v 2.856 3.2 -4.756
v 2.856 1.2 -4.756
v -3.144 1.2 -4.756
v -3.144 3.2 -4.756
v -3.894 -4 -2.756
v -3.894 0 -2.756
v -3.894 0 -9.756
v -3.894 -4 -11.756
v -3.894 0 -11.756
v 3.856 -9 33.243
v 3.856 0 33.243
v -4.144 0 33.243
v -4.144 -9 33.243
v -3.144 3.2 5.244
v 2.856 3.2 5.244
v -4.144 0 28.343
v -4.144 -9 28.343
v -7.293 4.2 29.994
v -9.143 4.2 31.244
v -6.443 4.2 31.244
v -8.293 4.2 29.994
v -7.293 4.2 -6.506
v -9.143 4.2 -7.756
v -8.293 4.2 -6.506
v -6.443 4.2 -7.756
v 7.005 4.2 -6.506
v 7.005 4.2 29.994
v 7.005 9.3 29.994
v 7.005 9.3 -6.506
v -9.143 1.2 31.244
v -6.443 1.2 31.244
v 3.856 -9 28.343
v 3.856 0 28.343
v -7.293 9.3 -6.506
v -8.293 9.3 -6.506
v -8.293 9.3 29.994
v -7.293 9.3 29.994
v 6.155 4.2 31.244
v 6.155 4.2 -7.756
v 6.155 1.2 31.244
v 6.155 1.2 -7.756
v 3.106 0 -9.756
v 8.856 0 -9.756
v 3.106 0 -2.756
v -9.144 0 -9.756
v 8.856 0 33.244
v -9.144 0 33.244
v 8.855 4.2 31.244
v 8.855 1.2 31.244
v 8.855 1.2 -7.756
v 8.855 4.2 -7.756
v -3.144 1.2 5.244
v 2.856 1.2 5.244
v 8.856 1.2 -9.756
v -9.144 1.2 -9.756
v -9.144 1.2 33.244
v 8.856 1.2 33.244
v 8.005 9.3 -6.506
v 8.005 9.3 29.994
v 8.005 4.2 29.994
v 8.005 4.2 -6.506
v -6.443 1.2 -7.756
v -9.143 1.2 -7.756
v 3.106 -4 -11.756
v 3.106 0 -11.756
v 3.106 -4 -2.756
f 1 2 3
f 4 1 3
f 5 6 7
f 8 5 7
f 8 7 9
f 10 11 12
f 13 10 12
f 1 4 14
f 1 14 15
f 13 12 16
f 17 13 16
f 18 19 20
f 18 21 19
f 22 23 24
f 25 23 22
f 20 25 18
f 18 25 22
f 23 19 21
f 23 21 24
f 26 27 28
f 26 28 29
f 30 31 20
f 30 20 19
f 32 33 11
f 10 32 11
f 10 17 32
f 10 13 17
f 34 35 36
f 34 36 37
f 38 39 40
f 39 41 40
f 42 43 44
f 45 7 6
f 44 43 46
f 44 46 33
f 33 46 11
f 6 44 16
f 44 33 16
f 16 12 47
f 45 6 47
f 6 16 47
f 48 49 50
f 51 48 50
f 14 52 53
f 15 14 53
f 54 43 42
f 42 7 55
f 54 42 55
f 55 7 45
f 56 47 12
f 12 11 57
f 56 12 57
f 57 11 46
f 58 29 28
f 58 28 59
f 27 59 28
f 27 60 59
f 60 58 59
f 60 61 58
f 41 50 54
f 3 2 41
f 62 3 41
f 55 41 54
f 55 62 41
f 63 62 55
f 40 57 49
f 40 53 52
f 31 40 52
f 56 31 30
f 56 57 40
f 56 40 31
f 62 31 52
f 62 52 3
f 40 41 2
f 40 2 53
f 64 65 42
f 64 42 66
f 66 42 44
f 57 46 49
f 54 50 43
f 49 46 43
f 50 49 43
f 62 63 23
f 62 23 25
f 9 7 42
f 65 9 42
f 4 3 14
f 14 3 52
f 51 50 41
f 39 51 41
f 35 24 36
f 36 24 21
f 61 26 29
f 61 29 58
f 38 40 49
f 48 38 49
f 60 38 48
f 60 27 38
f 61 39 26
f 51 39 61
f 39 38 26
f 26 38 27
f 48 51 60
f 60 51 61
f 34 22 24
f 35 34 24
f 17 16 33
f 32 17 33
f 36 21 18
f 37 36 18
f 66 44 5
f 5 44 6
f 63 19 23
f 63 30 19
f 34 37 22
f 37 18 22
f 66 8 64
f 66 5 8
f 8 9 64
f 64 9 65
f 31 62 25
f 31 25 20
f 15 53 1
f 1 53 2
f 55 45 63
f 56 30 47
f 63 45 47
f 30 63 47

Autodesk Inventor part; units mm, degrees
ref_plane "YZ Plane" through (0, 0, 0) normal (1, 0, 0) x (0, 1, 0)
ref_plane "XZ Plane" through (0, 0, 0) normal (0, 1, 0) x (-1, 0, 0)
ref_plane "XY Plane" through (0, 0, 0) normal (0, 0, 1) x (1, 0, 0)
sketch "Sketch1" plane through (0, 0, 0) normal (0, 1, 0) x (-1, 0, 0)
  line L0 (9.1437, 33.2437) -> (-8.8563, 33.2437)
  line L1 (-8.8563, 33.2437) -> (-8.8562, -9.7563)
  line L2 (-8.8562, -9.7563) -> (9.1438, -9.7563)
  line L3 (9.1438, -9.7563) -> (9.1437, 33.2437)
  point P0 (0, 0)
  dimension "d0" = 18
  dimension "d1" = 43
extrude "Extrusion1" add sketch "Sketch1" along normal blind 1.2
sketch "Sketch2" plane through (0, 1.2, 0) normal (0, 1, 0) x (1, 0, 0)
  line L0 (-6.4427, -31.2437) -> (-9.1427, -31.2437)
  line L1 (-9.1427, -31.2437) -> (-9.1427, 7.7563)
  line L2 (-9.1427, 7.7563) -> (-6.4428, 7.7563)
  line L3 (-6.4428, 7.7563) -> (-6.4427, -31.2437)
  line L4 (-9.1438, 9.7563) -> (-9.1437, -33.2437) projected
  line L5 (8.8562, 9.7563) -> (-9.1438, 9.7563) projected
  line L6 (-9.1437, -33.2437) -> (8.8563, -33.2437) projected
  line L7 (-0.1437, -33.2437) -> (-0.1438, 9.7563)
  line L8 (6.1553, -31.2437) -> (8.8553, -31.2437)
  line L9 (8.8553, -31.2437) -> (8.8552, 7.7563)
  line L10 (8.8552, 7.7563) -> (6.1552, 7.7563)
  line L11 (6.1552, 7.7563) -> (6.1553, -31.2437)
  line L12 (8.8562, 9.7563) -> (8.8563, -33.2437)
  point P0 (0, 0)
  dimension "d4" = 0.001
  dimension "d5" = 2
  dimension "d6" = 2
  dimension "d7" = 2.7
extrude "Extrusion2" add sketch "Sketch2" along normal blind 3 contours L0 L1 L2 L3 | L8 L11 L10 L9
sketch "Sketch3" plane through (0, 1.2, 0) normal (0, 1, 0) x (1, 0, 0)
  line L0 (2.8563, 4.7563) -> (-3.1437, 4.7563)
  line L1 (-3.1437, 4.7563) -> (-3.1437, -5.2437)
  line L2 (-3.1437, -5.2437) -> (2.8563, -5.2437)
  line L3 (2.8563, -5.2437) -> (2.8563, 4.7563)
  line L4 (8.8562, 9.7563) -> (-9.1438, 9.7563) projected
  line L5 (8.8563, -33.2437) -> (8.8562, 9.7563) projected
  line L6 (-9.1438, 9.7563) -> (-9.1437, -33.2437) projected
  point P0 (0, 0)
  dimension "d10" = 5
  dimension "d11" = 10
  dimension "d12" = 6
  dimension "d13" = 6
extrude "Extrusion3" add sketch "Sketch3" along normal blind 2
sketch "Sketch4" plane through (0, 0, 0) normal (0, -1, 0) x (1, 0, 0)
  line L0 (-3.8938, -11.7563) -> (3.1062, -11.7563)
  line L1 (3.1062, -11.7563) -> (3.1062, -2.7563)
  line L2 (3.1062, -2.7563) -> (-3.8938, -2.7563)
  line L3 (-3.8938, -2.7563) -> (-3.8938, -11.7563)
  line L4 (-9.1438, -9.7563) -> (-9.1437, 33.2437) projected
  line L5 (8.8563, 33.2437) -> (8.8562, -9.7563) projected
  line L6 (8.8562, -9.7563) -> (-9.1438, -9.7563) projected
  point P0 (0, 0)
  dimension "d16" = 7
  dimension "d17" = 5.25
  dimension "d18" = 5.75
  dimension "d19" = 7
  dimension "d20" = 2
extrude "Extrusion4" add sketch "Sketch4" along normal blind 4
sketch "Sketch5" plane through (0, 0, 0) normal (0, -1, 0) x (1, 0, 0)
  line L0 (3.8563, 33.2427) -> (-4.1437, 33.2427)
  line L1 (-4.1437, 33.2427) -> (-4.1437, 28.3427)
  line L2 (-4.1437, 28.3427) -> (3.8563, 28.3427)
  line L3 (3.8563, 28.3427) -> (3.8563, 33.2427)
  line L4 (8.8563, 33.2437) -> (8.8562, -9.7563) projected
  line L5 (-9.1438, -9.7563) -> (-9.1437, 33.2437) projected
  line L6 (-9.1437, 33.2437) -> (8.8563, 33.2437) projected
  point P0 (0, 0)
  dimension "d23" = 5
  dimension "d24" = 5
  dimension "d25" = 0.001
  dimension "d26" = 4.9
extrude "Extrusion5" add sketch "Sketch5" along normal blind 9
sketch "Sketch6" plane through (0, 4.2, 0) normal (0, 1, 0) x (1, 0, 0)
  line L0 (-8.2927, -29.9937) -> (-7.2927, -29.9937)
  line L1 (-7.2927, -29.9937) -> (-7.2928, 6.5063)
  line L2 (-7.2928, 6.5063) -> (-8.2927, 6.5063)
  line L3 (-8.2927, 6.5063) -> (-8.2927, -29.9937)
  line L4 (-9.1427, 7.7563) -> (-9.1427, -31.2437) projected
  line L5 (-6.4427, -31.2437) -> (-6.4428, 7.7563) projected
  line L6 (-9.1427, -31.2437) -> (-6.4427, -31.2437) projected
  line L7 (-6.4428, 7.7563) -> (-9.1427, 7.7563) projected
  line L8 (-9.1437, -33.2437) -> (8.8563, -33.2437) projected
  line L9 (-0.1437, -33.2437) -> (-0.1438, 9.7563)
  line L10 (8.8562, 9.7563) -> (-9.1438, 9.7563) projected
  line L11 (8.0053, -29.9937) -> (7.0053, -29.9937)
  line L12 (7.0053, -29.9937) -> (7.0052, 6.5063)
  line L13 (7.0052, 6.5063) -> (8.0052, 6.5063)
  line L14 (8.0052, 6.5063) -> (8.0053, -29.9937)
  line L15 (8.8552, 7.7563) -> (8.8553, -31.2437)
  line L16 (6.1553, -31.2437) -> (6.1552, 7.7563)
  line L17 (8.8553, -31.2437) -> (6.1553, -31.2437)
  line L18 (6.1552, 7.7563) -> (8.8552, 7.7563)
  point P0 (0, 0)
  point P1 (-7.7928, 6.5063)
  point P2 (-7.7927, -29.9937)
  point P3 (-7.7927, -31.2437)
  point P4 (-7.7927, 7.7563)
  point P5 (7.5052, 6.5063)
  point P6 (7.5053, -29.9937)
  point P7 (7.5053, -31.2437)
  point P8 (7.5052, 7.7563)
  dimension "d29" = 1
  dimension "d30" = 36.5
  dimension "d31" = 0.85
  dimension "d32" = 0.85
  dimension "d33" = 1.25
  dimension "d34" = 1.25
extrude "Extrusion6" add sketch "Sketch6" along normal blind 5.1 contours L3 L2 L1 L0 | L11 L12 L13 L14
properties part number "nano"
